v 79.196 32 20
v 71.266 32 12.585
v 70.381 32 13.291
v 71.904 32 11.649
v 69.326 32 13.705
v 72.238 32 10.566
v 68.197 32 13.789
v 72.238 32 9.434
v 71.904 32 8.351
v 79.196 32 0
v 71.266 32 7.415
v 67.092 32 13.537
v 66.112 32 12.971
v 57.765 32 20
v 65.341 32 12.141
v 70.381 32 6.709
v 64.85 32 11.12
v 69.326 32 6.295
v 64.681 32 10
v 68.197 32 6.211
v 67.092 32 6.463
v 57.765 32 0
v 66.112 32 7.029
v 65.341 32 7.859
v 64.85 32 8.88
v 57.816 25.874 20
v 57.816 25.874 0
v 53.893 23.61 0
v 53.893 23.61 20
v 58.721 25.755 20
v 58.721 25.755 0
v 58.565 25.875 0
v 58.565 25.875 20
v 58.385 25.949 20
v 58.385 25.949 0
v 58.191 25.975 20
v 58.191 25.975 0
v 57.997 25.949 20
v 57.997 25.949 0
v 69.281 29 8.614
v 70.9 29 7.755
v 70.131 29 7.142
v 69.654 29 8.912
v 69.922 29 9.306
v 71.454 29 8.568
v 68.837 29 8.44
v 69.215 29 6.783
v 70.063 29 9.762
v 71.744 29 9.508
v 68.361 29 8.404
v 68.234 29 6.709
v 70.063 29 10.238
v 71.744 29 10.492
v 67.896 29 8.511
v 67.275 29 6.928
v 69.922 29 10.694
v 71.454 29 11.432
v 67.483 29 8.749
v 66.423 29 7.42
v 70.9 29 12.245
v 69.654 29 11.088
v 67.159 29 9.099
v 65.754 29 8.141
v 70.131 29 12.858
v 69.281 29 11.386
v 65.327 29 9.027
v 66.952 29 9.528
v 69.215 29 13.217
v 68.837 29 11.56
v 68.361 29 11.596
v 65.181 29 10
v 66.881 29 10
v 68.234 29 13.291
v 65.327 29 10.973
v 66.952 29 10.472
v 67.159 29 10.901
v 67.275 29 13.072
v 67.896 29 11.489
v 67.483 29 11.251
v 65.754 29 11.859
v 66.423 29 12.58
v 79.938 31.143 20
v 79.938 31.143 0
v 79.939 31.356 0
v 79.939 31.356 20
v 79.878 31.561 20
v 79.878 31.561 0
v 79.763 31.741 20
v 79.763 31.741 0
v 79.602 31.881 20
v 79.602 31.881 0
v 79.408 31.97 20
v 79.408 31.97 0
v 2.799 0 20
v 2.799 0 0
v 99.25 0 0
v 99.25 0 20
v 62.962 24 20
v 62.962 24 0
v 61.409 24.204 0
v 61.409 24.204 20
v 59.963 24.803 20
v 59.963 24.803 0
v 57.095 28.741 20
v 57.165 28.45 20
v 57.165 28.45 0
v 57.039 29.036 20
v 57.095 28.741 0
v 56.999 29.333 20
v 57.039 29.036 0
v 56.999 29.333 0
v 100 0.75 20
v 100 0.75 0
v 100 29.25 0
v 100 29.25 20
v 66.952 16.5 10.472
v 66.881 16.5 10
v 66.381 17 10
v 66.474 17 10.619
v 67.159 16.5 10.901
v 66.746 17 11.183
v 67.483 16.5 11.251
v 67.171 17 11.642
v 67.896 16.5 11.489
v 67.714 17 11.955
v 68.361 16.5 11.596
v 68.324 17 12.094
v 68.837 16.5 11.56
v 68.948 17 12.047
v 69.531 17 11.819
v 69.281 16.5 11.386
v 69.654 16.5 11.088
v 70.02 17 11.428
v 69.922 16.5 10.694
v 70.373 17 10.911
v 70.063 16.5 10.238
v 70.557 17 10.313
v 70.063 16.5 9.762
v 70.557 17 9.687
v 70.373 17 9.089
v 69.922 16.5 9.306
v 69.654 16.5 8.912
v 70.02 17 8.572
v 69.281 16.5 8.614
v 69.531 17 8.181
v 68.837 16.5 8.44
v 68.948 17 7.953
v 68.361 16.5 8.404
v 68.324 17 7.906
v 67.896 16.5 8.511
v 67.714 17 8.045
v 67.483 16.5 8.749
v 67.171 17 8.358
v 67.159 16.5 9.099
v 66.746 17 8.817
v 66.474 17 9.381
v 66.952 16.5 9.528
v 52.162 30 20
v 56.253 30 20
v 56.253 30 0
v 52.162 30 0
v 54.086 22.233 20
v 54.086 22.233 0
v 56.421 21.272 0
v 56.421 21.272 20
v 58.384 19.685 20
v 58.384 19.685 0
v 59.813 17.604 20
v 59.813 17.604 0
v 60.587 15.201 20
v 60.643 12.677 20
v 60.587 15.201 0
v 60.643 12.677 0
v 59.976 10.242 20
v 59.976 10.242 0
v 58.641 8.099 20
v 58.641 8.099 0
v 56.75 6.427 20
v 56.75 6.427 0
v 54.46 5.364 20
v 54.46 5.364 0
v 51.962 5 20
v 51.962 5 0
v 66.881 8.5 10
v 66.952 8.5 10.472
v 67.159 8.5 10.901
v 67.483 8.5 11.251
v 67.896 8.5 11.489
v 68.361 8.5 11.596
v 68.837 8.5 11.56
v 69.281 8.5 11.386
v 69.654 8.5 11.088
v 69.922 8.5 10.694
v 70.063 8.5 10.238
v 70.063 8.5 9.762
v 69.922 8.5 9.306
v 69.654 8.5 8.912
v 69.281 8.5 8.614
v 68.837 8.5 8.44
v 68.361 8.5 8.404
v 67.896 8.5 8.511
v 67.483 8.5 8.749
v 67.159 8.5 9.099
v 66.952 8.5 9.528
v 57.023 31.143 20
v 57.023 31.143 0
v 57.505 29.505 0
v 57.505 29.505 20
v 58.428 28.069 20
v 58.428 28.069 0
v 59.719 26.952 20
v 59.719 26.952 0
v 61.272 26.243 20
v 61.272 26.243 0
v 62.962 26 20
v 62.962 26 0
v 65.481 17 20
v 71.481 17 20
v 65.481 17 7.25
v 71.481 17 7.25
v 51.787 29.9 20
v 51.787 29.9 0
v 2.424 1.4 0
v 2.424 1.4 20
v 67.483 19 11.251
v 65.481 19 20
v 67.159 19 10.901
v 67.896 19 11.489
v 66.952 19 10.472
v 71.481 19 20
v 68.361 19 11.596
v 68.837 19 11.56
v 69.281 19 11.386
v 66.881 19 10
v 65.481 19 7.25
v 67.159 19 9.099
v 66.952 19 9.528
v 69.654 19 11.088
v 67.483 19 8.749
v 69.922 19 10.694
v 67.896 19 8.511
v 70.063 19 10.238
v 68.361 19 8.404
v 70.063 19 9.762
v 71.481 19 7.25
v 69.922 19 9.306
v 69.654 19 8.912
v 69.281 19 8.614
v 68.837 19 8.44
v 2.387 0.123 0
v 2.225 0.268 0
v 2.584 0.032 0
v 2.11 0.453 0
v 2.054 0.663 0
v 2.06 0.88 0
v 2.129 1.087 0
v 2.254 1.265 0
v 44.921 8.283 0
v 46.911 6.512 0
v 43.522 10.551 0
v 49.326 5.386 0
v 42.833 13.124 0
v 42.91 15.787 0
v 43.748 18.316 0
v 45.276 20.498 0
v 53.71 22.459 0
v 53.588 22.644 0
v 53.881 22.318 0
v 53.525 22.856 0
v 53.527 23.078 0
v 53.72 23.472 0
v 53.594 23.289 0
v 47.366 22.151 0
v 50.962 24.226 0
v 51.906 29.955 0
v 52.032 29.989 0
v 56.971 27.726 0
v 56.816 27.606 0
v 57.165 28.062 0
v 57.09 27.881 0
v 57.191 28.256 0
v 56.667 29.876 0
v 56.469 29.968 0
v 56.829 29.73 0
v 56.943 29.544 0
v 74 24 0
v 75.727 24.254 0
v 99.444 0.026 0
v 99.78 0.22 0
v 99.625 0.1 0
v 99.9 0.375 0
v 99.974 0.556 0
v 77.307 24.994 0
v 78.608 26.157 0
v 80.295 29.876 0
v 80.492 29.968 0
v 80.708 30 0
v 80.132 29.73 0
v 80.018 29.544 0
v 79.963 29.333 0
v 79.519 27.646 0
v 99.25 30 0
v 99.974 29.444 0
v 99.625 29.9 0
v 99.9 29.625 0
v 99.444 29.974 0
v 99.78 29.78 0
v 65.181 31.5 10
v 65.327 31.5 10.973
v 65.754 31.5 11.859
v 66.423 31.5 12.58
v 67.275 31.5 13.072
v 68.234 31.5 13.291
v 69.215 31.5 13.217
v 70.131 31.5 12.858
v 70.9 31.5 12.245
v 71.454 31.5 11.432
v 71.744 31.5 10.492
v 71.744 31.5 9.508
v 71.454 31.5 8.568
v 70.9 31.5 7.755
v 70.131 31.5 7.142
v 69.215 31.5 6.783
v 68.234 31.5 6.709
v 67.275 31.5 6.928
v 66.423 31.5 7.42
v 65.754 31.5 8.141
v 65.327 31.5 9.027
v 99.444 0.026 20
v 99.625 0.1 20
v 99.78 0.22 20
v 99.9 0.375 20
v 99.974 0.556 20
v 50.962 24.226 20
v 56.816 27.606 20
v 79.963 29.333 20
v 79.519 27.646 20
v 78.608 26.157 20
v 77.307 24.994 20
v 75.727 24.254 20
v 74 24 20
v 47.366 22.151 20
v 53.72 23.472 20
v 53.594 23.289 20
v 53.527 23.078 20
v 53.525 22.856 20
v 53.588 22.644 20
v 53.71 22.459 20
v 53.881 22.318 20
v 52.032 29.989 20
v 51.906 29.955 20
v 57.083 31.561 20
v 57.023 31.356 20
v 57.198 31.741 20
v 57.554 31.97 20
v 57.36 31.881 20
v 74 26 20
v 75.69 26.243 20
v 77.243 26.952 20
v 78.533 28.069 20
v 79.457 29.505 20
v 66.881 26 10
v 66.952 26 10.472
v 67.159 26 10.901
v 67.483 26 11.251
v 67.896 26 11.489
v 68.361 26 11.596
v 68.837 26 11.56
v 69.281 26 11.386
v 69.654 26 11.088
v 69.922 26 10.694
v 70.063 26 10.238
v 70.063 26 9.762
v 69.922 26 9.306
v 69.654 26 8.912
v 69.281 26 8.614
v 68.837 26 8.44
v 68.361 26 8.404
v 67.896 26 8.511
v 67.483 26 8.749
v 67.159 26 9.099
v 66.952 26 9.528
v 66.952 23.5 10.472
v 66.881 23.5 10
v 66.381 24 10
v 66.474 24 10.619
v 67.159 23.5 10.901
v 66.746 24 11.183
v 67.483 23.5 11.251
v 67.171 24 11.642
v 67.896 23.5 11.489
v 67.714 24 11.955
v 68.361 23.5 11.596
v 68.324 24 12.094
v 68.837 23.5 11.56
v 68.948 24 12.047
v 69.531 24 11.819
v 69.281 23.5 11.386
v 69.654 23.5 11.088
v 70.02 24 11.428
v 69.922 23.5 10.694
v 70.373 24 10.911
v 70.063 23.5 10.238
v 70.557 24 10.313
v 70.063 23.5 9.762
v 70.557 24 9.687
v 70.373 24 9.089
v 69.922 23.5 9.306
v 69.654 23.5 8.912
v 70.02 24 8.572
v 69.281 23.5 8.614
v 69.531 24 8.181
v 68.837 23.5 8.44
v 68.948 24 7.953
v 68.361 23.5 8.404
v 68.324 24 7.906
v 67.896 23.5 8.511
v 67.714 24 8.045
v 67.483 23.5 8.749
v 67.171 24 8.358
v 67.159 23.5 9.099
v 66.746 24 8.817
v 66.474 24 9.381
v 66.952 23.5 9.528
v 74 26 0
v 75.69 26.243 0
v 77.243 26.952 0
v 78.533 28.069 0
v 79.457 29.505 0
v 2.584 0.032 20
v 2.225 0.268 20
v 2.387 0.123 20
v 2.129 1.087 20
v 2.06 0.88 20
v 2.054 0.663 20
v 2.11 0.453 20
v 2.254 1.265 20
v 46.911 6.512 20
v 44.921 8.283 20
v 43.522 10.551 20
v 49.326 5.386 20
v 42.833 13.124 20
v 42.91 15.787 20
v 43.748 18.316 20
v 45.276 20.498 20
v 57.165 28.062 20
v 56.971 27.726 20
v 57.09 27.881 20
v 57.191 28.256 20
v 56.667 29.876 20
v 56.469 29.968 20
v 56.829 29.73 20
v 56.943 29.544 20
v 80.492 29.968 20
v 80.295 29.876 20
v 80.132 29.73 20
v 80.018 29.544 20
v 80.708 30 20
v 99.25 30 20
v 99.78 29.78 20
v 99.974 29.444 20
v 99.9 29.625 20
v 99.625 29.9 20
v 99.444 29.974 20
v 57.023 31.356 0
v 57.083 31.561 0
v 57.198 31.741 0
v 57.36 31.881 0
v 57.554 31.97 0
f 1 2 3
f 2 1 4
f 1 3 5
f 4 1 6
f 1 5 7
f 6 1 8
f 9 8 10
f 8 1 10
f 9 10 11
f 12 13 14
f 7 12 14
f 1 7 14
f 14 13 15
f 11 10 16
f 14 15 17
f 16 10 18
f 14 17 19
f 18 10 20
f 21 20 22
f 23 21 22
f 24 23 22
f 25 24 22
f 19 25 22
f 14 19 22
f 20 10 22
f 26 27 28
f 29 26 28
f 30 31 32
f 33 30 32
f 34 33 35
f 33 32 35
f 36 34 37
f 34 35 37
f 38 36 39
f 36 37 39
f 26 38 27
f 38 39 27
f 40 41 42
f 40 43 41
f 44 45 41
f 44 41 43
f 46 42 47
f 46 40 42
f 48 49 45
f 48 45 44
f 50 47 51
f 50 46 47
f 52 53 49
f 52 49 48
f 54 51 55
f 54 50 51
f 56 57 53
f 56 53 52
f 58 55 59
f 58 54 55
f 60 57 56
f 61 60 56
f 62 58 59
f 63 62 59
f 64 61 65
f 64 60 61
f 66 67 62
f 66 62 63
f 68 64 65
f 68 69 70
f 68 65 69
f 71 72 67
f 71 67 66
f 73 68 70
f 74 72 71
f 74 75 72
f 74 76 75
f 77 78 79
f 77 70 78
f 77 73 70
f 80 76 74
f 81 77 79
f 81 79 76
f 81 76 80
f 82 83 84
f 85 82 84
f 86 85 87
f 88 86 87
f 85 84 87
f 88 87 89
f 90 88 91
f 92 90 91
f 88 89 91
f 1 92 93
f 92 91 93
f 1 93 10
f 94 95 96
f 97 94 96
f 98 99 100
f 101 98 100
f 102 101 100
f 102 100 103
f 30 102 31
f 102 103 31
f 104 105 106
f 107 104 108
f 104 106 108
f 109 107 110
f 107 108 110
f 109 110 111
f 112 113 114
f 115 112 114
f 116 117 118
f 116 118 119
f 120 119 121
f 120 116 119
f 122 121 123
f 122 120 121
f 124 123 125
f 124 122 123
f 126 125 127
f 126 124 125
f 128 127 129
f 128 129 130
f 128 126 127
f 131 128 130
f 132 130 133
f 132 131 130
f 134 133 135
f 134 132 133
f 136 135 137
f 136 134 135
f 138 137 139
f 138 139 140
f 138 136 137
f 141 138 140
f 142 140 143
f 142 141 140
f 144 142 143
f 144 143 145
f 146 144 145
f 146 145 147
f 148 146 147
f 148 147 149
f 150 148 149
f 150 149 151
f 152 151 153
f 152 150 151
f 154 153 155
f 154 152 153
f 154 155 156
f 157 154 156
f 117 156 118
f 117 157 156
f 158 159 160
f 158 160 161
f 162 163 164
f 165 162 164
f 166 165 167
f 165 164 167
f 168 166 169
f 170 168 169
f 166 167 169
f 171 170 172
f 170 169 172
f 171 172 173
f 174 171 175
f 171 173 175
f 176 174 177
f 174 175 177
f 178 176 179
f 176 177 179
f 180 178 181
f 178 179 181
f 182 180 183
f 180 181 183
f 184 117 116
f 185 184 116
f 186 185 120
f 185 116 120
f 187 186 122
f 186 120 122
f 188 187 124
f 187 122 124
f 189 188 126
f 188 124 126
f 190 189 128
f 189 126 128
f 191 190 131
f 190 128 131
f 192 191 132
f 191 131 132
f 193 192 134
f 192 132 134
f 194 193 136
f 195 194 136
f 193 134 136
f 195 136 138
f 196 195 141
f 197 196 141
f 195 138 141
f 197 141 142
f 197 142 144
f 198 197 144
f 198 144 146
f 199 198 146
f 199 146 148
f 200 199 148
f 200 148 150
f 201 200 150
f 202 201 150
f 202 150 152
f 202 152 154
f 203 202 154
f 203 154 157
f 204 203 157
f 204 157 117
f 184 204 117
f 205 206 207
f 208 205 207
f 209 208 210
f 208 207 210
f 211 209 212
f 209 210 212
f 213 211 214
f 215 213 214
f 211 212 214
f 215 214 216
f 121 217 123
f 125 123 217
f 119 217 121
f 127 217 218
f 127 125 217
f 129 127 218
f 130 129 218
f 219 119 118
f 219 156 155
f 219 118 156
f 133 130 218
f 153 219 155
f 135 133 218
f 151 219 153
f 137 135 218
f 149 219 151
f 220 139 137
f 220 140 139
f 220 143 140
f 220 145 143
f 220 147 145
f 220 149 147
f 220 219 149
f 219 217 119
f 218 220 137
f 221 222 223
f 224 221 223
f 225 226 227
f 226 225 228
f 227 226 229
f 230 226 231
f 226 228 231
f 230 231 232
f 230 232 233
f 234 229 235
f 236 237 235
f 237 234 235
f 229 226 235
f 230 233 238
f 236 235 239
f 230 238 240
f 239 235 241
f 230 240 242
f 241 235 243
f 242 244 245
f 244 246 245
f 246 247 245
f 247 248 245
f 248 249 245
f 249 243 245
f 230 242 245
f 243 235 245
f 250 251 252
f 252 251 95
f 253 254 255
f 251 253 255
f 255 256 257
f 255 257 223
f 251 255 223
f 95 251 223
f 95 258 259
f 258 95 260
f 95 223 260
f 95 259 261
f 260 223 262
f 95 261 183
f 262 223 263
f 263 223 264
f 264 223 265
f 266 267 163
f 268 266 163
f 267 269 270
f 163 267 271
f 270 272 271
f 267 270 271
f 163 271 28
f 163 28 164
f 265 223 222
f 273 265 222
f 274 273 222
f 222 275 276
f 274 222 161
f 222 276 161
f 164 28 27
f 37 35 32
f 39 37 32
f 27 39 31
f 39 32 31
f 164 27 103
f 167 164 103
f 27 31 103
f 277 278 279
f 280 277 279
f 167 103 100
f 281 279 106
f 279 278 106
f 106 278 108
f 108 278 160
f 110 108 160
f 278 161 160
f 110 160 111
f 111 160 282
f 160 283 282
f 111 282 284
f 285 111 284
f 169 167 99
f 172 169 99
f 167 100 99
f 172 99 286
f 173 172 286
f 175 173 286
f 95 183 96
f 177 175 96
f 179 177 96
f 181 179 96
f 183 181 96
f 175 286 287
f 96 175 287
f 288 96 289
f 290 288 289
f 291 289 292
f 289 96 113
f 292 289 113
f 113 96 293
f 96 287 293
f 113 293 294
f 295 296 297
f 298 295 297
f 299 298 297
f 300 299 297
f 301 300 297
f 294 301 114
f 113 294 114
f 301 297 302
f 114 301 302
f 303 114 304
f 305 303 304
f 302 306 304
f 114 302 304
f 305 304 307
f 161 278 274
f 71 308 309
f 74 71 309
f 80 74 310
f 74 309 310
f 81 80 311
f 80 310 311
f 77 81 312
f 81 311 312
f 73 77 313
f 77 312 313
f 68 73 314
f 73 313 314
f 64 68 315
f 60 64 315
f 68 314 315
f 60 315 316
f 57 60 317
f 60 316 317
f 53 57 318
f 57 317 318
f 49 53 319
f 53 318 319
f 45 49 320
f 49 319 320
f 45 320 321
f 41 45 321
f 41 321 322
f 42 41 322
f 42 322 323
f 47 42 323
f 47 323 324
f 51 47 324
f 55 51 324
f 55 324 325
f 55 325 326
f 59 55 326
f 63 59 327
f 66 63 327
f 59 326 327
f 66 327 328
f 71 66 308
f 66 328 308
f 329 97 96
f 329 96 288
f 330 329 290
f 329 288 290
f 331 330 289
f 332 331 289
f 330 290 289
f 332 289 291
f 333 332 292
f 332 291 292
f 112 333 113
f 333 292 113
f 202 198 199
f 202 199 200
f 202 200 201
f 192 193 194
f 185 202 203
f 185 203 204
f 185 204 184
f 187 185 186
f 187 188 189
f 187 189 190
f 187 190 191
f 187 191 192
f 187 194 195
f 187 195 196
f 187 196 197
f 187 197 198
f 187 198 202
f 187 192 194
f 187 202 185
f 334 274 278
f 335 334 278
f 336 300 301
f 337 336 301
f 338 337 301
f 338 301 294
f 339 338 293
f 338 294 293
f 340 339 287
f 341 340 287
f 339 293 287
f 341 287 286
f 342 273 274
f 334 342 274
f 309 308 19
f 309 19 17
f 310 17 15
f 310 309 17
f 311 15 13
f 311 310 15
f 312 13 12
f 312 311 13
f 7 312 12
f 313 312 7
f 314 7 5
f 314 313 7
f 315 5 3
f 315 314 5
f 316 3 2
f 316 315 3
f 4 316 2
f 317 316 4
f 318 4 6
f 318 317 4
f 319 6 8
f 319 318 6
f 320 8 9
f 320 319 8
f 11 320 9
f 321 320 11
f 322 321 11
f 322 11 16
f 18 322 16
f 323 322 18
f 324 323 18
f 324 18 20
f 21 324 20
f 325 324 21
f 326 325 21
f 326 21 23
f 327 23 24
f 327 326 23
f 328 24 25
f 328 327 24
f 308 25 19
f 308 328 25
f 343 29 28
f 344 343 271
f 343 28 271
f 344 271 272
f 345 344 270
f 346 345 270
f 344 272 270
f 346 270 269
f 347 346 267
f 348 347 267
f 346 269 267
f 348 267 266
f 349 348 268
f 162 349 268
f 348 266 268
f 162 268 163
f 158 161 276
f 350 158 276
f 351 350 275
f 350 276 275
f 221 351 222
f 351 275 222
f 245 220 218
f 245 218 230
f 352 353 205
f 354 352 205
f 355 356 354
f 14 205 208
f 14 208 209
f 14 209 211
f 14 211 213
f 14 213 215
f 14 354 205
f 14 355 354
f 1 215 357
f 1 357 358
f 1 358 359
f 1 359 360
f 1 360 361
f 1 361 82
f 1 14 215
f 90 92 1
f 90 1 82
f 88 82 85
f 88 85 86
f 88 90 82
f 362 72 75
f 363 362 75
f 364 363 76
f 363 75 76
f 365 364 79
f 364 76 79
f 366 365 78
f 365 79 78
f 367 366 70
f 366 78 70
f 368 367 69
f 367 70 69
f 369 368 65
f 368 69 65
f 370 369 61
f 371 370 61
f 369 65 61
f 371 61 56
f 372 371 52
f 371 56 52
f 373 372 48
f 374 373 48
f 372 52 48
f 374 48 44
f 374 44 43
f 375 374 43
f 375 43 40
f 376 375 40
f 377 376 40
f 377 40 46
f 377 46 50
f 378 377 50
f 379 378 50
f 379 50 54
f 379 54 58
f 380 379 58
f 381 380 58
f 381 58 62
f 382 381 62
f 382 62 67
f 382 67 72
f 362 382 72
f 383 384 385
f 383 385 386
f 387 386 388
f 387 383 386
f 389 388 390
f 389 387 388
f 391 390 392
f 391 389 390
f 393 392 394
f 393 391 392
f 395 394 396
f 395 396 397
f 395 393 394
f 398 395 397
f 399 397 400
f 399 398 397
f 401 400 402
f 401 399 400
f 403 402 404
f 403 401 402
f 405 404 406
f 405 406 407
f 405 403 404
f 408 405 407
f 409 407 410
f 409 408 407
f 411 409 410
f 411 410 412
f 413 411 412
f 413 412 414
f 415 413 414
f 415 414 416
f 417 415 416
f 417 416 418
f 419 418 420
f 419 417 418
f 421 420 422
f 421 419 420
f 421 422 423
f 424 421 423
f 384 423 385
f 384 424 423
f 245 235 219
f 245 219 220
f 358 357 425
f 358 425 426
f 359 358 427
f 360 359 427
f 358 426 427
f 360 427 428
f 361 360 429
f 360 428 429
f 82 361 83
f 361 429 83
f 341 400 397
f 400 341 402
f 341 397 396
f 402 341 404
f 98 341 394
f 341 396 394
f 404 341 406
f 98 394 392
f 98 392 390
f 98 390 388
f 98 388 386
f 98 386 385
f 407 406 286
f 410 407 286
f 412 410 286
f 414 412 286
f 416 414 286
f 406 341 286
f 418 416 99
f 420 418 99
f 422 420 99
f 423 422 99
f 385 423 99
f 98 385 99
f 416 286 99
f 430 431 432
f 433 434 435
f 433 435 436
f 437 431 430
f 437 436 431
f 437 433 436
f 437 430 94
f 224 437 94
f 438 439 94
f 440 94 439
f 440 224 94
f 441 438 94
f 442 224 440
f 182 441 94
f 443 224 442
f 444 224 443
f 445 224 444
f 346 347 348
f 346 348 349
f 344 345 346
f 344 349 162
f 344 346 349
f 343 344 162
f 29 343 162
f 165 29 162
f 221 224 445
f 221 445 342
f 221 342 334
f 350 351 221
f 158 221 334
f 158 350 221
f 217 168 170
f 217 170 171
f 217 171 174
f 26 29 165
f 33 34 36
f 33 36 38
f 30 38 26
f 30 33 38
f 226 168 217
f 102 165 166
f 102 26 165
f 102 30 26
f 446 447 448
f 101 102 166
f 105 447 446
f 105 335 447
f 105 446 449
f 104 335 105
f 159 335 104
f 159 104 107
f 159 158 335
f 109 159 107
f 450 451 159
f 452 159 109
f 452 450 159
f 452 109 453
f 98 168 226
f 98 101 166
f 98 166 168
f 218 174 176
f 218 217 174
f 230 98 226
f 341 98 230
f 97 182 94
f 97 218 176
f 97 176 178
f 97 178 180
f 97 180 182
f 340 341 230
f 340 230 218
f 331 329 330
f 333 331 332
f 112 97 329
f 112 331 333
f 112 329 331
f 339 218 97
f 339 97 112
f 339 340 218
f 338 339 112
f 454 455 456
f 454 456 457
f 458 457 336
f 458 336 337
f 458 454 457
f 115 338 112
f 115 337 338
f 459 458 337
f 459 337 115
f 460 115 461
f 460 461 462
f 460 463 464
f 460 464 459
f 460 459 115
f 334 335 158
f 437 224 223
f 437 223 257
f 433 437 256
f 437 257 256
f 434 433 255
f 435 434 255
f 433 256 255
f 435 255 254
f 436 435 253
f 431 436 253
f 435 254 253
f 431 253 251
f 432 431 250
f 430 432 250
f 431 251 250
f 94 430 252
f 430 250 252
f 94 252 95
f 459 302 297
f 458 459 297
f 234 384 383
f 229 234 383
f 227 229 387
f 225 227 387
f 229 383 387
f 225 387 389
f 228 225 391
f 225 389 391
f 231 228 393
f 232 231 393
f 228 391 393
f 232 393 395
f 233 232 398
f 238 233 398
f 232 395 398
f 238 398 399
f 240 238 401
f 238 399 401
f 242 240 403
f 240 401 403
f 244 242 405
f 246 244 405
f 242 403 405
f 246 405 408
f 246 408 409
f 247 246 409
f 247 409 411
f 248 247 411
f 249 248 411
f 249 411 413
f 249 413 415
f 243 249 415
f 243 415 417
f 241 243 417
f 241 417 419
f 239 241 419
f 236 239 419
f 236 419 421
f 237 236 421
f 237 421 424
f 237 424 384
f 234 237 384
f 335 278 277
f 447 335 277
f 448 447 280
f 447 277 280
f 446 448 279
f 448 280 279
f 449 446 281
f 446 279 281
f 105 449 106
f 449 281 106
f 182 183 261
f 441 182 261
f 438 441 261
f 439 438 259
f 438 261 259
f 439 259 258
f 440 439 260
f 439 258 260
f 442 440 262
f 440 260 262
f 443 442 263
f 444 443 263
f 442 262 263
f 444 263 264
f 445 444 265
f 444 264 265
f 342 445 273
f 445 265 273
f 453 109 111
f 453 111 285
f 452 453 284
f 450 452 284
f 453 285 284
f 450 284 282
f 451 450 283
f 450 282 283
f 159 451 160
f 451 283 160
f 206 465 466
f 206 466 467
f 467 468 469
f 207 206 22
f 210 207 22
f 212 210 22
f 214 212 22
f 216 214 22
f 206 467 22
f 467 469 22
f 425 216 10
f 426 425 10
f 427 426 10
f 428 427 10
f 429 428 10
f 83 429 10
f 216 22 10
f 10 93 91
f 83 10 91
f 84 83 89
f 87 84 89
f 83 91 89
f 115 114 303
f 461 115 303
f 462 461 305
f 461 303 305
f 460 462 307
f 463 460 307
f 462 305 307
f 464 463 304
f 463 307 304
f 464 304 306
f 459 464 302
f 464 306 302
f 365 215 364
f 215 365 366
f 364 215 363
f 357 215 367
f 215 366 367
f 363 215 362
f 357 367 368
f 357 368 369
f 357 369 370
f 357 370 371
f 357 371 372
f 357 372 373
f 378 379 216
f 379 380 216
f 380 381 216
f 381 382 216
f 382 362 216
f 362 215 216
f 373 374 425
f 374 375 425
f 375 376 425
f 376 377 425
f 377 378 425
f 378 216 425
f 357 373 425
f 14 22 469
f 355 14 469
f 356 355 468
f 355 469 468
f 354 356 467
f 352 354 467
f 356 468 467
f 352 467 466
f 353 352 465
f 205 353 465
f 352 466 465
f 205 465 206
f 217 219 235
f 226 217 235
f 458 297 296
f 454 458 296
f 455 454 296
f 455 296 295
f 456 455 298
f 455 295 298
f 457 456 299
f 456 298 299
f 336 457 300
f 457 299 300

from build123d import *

# Parameters (mm, degrees)
F3_W      = 6
F3_H      = 2
F4_DEPTH  = 20
F5_DEPTH  = 7.25
F6_R      = 3.3
F6_R_2    = 1.6
F7_DEPTH  = 3
F8_DEPTH  = 23.5
F9_SIZE   = 0.5
F9_2_SIZE = 0.5


with BuildPart() as f4:
    # F3 (on Top) → F4 (new body)
    with BuildSketch(Plane.XY):
        with BuildLine():
            Line((51.7874861214, 29.8995190528), (2.4240381057, 1.3995190528))
            ThreePointArc((2.4240381057, 1.3995190528), (2.074593736, 0.5558857162), (2.7990381057, 0))
            Line((2.7990381057, 0), (99.25, 0))
            ThreePointArc((99.25, 0), (99.7803300859, 0.2196699141), (100, 0.75))
            Line((100, 0.75), (100, 29.25))
            ThreePointArc((100, 29.25), (99.7803300859, 29.7803300859), (99.25, 30))
            Line((99.25, 30), (80.7082039325, 30))
            ThreePointArc((80.7082039325, 30), (80.2082039325, 29.8090169944), (79.96284794, 29.3333333333))
            ThreePointArc((79.96284794, 29.3333333333), (78, 25.527864045), (74, 24))
            Line((74, 24), (62.9615242271, 24))
            ThreePointArc((62.9615242271, 24), (60.6666869252, 24.4561997008), (58.7208176535, 25.7554260807))
            ThreePointArc((58.7208176535, 25.7554260807), (58.2884545214, 25.9684602763), (57.8157293317, 25.8743733936))
            Line((57.8157293317, 25.8743733936), (53.8930627208, 23.6096207698))
            ThreePointArc((53.8930627208, 23.6096207698), (53.5253110496, 22.8560827046), (54.0859143365, 22.2325565527))
            ThreePointArc((54.0859143365, 22.2325565527), (60.64302811, 12.6769873321), (51.9615242271, 5))
            ThreePointArc((51.9615242271, 5), (43.0837022309, 11.8121924121), (47.3660254038, 22.1506350946))
            Line((47.3660254038, 22.1506350946), (50.9615242271, 24.2264973081))
            Line((50.9615242271, 24.2264973081), (56.8157293317, 27.6064242012))
            ThreePointArc((56.8157293317, 27.6064242012), (57.1335735571, 27.9687727831), (57.1652620979, 28.4497273369))
            ThreePointArc((57.1652620979, 28.4497273369), (57.0653935218, 28.8884053319), (56.9986762871, 29.3333333333))
            ThreePointArc((56.9986762871, 29.3333333333), (56.7533202946, 29.8090169944), (56.2533202946, 30))
            Line((56.2533202946, 30), (52.1624861214, 30))
            ThreePointArc((52.1624861214, 30), (51.9683718376, 29.9744443697), (51.7874861214, 29.8995190528))
        make_face()
        with Locations((68.4807621135, 18)):
            Rectangle(F3_W, F3_H, mode=Mode.SUBTRACT)
    extrude(amount=F4_DEPTH)

    # F3 (on Top) → F5 (join)
    with BuildSketch(Plane.XY):
        with Locations((68.4807621135, 18)):
            Rectangle(F3_W, F3_H)
    extrude(amount=F5_DEPTH)


with BuildPart() as f4b:
    # F3 (on Top) → F4, piece 2 (new body)
    with BuildSketch(Plane.XY):
        with BuildLine():
            ThreePointArc((57.0230643154, 31.1428571429), (59.0336022028, 27.4644263239), (62.9615242271, 26))
            Line((62.9615242271, 26), (74, 26))
            ThreePointArc((74, 26), (77.9279220242, 27.4644263239), (79.9384599117, 31.1428571429))
            ThreePointArc((79.9384599117, 31.1428571429), (79.7630991322, 31.740990253), (79.1961524227, 32))
            Line((79.1961524227, 32), (57.7653718044, 32))
            ThreePointArc((57.7653718044, 32), (57.1984250948, 31.740990253), (57.0230643154, 31.1428571429))
        make_face()
    extrude(amount=F4_DEPTH)

    # F6 (on face) → F7 (cut)
    with BuildSketch(Plane(origin=(0, 32, 0), x_dir=(-1, 0, 0), z_dir=(0, 1, 0))):
        with Locations((-68.4807621135, 10)):
            Circle(F6_R)
        with Locations((-68.4807621135, 10)):
            Circle(F6_R_2, mode=Mode.SUBTRACT)
    extrude(amount=-F7_DEPTH, mode=Mode.SUBTRACT)


with BuildPart() as f8_tool:
    # F6 (on face) → F8 (new body)
    with BuildSketch(Plane(origin=(0, 32, 0), x_dir=(-1, 0, 0), z_dir=(0, 1, 0))):
        with Locations((-68.4807621135, 10)):
            Circle(F6_R_2)
    extrude(amount=-F8_DEPTH)


with BuildPart() as f4_1:
    add(f4.part)

    # F8: cut by f8_tool
    add(f8_tool.part, mode=Mode.SUBTRACT)

    # F9#2
    f9_2_edges = [f4_1.edges().sort_by_distance(p)[0] for p in [
        (70.080762, 24, 10),
        (70.080762, 17, 10),
    ]]
    chamfer(f9_2_edges, length=F9_2_SIZE)


with BuildPart() as f4b_1:
    add(f4b.part)

    # F8: cut by f8_tool
    add(f8_tool.part, mode=Mode.SUBTRACT)

    # F9
    f9_edges = [f4b_1.edges().sort_by_distance(p)[0] for p in [
        (71.780762, 32, 10),
    ]]
    chamfer(f9_edges, length=F9_SIZE)


solid = Compound([f4_1.part, f4b_1.part])
